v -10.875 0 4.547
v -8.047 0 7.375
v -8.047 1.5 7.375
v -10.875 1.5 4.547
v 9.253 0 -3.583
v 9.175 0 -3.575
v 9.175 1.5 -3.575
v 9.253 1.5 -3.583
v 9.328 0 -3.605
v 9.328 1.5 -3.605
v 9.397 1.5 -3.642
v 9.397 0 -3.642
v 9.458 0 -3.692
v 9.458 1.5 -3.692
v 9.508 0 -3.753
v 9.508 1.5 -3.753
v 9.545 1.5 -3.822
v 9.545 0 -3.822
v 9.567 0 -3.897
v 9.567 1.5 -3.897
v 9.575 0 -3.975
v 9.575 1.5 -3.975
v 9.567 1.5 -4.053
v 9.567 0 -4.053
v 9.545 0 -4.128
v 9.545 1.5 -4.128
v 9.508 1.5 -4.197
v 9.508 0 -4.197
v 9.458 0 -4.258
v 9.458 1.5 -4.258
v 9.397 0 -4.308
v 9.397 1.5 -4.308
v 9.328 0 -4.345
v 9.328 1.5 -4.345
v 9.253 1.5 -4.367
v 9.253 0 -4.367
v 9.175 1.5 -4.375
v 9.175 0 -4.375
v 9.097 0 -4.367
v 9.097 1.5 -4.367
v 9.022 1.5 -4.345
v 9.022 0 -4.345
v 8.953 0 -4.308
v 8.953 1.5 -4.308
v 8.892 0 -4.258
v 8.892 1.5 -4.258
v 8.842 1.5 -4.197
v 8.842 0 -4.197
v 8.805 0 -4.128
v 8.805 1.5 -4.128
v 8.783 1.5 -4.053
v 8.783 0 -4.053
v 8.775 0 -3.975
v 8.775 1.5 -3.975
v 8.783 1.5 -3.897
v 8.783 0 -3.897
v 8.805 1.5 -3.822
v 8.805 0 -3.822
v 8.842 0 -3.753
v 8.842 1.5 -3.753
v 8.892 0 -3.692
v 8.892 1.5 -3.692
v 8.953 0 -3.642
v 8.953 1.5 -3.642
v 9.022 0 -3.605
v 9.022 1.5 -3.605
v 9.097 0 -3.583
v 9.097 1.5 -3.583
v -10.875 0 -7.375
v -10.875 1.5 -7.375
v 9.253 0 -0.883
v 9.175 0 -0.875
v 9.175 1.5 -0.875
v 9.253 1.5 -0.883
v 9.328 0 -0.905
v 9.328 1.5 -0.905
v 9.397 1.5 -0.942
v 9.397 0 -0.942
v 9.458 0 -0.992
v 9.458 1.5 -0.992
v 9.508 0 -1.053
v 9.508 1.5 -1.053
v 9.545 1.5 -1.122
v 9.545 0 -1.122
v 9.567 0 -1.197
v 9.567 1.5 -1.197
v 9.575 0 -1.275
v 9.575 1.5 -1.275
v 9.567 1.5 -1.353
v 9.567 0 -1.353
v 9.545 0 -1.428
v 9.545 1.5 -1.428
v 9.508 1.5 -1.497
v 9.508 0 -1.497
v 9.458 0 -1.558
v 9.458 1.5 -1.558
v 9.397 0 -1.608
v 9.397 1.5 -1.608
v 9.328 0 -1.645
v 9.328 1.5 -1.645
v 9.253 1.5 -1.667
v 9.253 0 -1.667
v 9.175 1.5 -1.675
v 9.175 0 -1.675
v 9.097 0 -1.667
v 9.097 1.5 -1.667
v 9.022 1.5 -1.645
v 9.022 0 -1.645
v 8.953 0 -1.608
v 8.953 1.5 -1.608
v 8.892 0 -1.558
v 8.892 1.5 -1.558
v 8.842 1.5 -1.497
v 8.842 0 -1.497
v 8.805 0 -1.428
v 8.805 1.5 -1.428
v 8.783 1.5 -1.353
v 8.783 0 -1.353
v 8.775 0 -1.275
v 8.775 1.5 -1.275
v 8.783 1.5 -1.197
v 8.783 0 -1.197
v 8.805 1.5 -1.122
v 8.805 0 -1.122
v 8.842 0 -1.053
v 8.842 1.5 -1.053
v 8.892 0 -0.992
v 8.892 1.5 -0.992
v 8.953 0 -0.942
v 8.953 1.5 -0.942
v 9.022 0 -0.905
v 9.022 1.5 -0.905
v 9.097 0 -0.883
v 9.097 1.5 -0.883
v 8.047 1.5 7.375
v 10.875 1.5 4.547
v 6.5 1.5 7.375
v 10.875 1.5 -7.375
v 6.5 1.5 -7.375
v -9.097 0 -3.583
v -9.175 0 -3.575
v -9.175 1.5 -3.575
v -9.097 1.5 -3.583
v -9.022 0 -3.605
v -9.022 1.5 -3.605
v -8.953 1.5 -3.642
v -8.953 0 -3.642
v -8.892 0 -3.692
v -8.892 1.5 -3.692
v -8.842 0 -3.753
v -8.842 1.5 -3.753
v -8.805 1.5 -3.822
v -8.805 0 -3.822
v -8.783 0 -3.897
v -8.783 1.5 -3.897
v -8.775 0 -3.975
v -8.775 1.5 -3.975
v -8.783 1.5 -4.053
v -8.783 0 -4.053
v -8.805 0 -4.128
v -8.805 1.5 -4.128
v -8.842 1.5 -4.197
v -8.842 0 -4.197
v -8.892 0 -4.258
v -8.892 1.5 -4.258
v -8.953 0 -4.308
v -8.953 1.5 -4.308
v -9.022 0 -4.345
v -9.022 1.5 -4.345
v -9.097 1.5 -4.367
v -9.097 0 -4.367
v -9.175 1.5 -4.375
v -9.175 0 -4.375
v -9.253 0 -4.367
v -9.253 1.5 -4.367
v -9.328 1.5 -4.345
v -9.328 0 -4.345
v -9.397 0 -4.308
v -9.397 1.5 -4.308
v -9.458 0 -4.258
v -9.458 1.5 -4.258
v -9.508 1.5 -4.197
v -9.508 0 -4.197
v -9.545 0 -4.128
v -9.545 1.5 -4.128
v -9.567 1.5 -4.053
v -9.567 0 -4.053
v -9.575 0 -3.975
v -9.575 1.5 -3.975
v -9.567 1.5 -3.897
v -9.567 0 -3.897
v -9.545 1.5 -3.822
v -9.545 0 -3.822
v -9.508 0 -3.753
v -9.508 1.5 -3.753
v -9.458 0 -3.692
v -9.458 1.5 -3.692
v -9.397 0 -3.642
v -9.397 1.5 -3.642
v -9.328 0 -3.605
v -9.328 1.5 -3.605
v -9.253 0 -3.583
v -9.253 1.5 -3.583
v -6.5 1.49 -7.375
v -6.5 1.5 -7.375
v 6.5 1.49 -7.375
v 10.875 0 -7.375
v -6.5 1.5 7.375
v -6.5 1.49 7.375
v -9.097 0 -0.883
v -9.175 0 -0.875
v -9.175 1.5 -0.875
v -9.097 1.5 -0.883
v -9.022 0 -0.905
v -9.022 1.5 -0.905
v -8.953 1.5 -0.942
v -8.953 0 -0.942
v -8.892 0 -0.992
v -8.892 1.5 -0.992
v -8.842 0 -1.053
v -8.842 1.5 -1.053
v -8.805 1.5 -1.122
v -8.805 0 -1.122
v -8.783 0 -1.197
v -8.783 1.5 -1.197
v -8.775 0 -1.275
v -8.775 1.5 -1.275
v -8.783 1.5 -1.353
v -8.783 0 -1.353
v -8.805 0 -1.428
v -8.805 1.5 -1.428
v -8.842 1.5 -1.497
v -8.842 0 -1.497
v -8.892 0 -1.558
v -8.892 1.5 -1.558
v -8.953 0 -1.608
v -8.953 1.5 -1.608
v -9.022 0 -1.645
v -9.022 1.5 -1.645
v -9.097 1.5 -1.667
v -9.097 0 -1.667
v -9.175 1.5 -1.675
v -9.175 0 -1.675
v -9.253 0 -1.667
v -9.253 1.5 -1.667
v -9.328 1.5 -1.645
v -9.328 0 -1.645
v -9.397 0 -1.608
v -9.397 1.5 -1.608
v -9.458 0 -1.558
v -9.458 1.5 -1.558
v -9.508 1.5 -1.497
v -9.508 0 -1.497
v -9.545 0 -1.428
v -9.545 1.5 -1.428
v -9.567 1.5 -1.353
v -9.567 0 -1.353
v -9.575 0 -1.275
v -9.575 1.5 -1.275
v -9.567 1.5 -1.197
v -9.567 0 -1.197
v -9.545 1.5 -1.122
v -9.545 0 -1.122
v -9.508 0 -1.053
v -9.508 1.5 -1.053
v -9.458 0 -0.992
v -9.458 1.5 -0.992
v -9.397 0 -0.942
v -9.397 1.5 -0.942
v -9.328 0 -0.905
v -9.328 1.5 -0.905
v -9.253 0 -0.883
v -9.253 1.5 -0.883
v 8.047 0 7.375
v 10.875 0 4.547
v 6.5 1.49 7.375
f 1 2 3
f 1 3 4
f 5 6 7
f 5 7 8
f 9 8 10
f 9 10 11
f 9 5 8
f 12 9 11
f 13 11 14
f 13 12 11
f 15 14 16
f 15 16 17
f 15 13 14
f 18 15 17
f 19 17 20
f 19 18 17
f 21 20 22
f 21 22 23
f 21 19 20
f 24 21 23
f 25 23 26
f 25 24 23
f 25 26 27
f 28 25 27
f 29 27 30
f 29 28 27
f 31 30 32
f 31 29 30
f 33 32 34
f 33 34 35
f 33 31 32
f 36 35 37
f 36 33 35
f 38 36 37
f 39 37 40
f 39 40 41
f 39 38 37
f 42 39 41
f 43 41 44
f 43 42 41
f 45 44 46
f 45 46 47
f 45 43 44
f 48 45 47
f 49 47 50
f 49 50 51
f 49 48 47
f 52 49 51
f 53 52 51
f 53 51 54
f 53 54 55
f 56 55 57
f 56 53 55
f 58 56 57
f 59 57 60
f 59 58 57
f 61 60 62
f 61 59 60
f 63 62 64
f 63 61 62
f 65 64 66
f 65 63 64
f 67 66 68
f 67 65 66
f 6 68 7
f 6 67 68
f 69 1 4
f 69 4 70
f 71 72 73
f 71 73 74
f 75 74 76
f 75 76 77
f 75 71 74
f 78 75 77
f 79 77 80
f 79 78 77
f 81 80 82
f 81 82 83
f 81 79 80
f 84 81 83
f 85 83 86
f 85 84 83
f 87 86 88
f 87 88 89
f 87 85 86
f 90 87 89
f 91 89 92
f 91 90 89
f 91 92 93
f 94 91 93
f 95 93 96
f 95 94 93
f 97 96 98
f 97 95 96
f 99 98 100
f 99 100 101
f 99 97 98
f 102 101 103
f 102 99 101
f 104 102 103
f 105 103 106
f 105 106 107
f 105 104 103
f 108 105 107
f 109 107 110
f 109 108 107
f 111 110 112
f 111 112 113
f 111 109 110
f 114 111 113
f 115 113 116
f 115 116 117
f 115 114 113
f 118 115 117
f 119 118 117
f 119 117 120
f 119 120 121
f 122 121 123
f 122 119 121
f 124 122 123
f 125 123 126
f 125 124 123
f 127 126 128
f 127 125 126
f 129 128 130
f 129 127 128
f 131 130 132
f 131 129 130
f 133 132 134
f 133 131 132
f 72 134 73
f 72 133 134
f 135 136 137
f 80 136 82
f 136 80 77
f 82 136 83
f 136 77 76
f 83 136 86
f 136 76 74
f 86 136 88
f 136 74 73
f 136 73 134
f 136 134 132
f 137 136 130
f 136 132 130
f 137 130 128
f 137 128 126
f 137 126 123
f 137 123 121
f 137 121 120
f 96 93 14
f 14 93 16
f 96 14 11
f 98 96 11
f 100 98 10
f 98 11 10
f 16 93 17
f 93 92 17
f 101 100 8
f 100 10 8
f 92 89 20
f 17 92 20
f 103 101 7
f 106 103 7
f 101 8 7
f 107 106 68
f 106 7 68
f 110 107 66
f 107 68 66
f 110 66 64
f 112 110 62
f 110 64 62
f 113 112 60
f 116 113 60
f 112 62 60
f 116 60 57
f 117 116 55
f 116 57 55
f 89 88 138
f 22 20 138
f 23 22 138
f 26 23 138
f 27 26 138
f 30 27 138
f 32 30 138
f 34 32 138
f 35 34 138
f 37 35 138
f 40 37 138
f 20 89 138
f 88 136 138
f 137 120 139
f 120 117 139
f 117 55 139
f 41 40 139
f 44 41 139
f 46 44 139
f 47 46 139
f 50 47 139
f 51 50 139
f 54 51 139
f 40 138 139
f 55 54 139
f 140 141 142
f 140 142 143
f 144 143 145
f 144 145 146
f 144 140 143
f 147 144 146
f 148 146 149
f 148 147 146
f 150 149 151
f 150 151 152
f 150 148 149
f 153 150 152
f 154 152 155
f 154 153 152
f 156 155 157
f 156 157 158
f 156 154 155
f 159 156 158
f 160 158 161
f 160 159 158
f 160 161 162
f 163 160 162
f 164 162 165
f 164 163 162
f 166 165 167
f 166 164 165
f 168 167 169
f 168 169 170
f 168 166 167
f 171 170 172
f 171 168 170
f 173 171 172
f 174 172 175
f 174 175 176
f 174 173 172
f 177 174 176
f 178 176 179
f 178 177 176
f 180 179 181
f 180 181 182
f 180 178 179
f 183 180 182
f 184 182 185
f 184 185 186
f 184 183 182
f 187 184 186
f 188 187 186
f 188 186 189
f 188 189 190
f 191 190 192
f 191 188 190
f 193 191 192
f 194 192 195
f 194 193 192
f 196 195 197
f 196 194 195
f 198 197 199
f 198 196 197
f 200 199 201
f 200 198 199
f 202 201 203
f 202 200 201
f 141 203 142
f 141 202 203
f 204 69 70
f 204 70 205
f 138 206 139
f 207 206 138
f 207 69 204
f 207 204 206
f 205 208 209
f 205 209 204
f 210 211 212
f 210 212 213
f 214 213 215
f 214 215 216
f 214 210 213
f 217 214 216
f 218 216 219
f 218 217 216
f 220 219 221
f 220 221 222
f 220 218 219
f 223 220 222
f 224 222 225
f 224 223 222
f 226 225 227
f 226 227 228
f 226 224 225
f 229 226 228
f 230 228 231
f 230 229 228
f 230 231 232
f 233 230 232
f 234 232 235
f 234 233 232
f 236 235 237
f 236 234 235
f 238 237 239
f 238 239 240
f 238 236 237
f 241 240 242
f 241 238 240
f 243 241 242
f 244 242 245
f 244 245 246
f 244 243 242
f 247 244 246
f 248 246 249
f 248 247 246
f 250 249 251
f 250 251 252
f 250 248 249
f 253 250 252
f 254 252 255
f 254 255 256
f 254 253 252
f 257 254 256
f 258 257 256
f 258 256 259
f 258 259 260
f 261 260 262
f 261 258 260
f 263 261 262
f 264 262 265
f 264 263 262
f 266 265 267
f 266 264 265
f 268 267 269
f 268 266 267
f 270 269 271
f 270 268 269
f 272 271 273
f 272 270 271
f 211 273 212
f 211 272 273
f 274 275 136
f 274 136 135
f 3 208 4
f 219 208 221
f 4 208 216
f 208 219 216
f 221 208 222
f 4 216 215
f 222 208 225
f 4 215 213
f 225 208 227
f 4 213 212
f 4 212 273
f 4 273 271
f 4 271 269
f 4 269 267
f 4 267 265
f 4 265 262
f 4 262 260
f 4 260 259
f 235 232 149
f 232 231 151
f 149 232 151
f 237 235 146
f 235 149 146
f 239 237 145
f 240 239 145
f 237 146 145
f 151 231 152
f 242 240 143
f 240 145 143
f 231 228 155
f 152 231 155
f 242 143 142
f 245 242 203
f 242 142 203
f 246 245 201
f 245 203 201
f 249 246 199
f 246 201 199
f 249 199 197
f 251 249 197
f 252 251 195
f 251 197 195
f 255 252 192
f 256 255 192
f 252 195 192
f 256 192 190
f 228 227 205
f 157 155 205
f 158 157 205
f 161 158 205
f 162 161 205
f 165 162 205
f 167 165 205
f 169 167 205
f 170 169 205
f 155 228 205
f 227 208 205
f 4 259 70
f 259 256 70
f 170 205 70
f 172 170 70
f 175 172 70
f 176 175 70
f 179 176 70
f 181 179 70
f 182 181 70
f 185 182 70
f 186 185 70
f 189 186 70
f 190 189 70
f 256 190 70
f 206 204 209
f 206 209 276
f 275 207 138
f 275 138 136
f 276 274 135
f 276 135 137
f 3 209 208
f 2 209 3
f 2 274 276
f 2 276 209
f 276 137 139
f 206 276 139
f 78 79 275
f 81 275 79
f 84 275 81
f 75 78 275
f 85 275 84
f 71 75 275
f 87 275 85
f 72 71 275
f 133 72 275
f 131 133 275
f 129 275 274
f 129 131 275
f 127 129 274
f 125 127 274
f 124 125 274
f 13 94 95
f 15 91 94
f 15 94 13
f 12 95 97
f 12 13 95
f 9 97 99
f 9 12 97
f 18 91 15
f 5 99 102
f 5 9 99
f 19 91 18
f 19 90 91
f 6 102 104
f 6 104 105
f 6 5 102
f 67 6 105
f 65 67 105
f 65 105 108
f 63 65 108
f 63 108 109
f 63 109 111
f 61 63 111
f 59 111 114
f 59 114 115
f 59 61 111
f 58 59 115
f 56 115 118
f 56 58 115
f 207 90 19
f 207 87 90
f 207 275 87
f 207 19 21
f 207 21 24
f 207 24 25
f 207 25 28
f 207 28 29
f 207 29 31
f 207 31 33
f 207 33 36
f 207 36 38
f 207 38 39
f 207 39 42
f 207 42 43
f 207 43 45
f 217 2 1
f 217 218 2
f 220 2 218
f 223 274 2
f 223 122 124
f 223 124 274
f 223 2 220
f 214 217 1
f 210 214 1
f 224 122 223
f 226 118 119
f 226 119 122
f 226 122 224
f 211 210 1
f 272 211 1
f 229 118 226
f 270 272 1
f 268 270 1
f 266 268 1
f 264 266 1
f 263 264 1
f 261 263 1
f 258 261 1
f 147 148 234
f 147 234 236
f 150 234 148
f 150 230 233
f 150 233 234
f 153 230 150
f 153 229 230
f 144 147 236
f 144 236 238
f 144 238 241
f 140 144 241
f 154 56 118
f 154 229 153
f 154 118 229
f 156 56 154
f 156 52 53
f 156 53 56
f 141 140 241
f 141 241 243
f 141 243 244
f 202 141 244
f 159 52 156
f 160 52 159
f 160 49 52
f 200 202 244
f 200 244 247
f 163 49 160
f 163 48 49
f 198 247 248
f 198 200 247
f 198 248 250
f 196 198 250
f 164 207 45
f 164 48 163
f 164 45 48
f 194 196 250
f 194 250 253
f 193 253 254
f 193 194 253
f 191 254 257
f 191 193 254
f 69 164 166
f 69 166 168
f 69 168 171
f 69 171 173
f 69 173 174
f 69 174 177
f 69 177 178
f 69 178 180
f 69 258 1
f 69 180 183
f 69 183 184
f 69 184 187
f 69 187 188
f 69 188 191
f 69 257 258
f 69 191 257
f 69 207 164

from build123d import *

# Parameters (mm, degrees)
ESQUISSE1_R             = 0.4
BOSS_EXTRU_1_DEPTH      = 1.5
ESQUISSE2_W             = 13
ESQUISSE2_H             = 14.75
ENL_V_MAT_EXTRU_1_DEPTH = 0.01


with BuildPart() as part:
    # Esquisse1 → Boss.-Extru.1 (new body)
    with BuildSketch(Plane(origin=(0, 0, 0), x_dir=(1, 0, 0), z_dir=(0, 1, 0))):
        Polygon((-10.875, 7.375), (10.875, 7.375), (10.875, -4.546572875), (8.046572875, -7.375), (-8.046572875, -7.375), (-10.875, -4.546572875), align=None)
        with Locations(Location((-9.175, 1.275, 0), (0, 0, 270))):
            Circle(ESQUISSE1_R, mode=Mode.SUBTRACT)
        with Locations(Location((-9.175, 3.975, 0), (0, 0, 270))):
            Circle(ESQUISSE1_R, mode=Mode.SUBTRACT)
        with Locations(Location((9.175, 1.275, 0), (0, 0, 270))):
            Circle(ESQUISSE1_R, mode=Mode.SUBTRACT)
        with Locations(Location((9.175, 3.975, 0), (0, 0, 270))):
            Circle(ESQUISSE1_R, mode=Mode.SUBTRACT)
    extrude(amount=BOSS_EXTRU_1_DEPTH)

    # Esquisse2 → Enlèv. mat.-Extru.1 (cut)
    with BuildSketch(Plane(origin=(0, 1.5, 0), x_dir=(1, 0, 0), z_dir=(0, 1, 0))):
        Rectangle(ESQUISSE2_W, ESQUISSE2_H)
    extrude(amount=-ENL_V_MAT_EXTRU_1_DEPTH, mode=Mode.SUBTRACT)


solid = part.part
